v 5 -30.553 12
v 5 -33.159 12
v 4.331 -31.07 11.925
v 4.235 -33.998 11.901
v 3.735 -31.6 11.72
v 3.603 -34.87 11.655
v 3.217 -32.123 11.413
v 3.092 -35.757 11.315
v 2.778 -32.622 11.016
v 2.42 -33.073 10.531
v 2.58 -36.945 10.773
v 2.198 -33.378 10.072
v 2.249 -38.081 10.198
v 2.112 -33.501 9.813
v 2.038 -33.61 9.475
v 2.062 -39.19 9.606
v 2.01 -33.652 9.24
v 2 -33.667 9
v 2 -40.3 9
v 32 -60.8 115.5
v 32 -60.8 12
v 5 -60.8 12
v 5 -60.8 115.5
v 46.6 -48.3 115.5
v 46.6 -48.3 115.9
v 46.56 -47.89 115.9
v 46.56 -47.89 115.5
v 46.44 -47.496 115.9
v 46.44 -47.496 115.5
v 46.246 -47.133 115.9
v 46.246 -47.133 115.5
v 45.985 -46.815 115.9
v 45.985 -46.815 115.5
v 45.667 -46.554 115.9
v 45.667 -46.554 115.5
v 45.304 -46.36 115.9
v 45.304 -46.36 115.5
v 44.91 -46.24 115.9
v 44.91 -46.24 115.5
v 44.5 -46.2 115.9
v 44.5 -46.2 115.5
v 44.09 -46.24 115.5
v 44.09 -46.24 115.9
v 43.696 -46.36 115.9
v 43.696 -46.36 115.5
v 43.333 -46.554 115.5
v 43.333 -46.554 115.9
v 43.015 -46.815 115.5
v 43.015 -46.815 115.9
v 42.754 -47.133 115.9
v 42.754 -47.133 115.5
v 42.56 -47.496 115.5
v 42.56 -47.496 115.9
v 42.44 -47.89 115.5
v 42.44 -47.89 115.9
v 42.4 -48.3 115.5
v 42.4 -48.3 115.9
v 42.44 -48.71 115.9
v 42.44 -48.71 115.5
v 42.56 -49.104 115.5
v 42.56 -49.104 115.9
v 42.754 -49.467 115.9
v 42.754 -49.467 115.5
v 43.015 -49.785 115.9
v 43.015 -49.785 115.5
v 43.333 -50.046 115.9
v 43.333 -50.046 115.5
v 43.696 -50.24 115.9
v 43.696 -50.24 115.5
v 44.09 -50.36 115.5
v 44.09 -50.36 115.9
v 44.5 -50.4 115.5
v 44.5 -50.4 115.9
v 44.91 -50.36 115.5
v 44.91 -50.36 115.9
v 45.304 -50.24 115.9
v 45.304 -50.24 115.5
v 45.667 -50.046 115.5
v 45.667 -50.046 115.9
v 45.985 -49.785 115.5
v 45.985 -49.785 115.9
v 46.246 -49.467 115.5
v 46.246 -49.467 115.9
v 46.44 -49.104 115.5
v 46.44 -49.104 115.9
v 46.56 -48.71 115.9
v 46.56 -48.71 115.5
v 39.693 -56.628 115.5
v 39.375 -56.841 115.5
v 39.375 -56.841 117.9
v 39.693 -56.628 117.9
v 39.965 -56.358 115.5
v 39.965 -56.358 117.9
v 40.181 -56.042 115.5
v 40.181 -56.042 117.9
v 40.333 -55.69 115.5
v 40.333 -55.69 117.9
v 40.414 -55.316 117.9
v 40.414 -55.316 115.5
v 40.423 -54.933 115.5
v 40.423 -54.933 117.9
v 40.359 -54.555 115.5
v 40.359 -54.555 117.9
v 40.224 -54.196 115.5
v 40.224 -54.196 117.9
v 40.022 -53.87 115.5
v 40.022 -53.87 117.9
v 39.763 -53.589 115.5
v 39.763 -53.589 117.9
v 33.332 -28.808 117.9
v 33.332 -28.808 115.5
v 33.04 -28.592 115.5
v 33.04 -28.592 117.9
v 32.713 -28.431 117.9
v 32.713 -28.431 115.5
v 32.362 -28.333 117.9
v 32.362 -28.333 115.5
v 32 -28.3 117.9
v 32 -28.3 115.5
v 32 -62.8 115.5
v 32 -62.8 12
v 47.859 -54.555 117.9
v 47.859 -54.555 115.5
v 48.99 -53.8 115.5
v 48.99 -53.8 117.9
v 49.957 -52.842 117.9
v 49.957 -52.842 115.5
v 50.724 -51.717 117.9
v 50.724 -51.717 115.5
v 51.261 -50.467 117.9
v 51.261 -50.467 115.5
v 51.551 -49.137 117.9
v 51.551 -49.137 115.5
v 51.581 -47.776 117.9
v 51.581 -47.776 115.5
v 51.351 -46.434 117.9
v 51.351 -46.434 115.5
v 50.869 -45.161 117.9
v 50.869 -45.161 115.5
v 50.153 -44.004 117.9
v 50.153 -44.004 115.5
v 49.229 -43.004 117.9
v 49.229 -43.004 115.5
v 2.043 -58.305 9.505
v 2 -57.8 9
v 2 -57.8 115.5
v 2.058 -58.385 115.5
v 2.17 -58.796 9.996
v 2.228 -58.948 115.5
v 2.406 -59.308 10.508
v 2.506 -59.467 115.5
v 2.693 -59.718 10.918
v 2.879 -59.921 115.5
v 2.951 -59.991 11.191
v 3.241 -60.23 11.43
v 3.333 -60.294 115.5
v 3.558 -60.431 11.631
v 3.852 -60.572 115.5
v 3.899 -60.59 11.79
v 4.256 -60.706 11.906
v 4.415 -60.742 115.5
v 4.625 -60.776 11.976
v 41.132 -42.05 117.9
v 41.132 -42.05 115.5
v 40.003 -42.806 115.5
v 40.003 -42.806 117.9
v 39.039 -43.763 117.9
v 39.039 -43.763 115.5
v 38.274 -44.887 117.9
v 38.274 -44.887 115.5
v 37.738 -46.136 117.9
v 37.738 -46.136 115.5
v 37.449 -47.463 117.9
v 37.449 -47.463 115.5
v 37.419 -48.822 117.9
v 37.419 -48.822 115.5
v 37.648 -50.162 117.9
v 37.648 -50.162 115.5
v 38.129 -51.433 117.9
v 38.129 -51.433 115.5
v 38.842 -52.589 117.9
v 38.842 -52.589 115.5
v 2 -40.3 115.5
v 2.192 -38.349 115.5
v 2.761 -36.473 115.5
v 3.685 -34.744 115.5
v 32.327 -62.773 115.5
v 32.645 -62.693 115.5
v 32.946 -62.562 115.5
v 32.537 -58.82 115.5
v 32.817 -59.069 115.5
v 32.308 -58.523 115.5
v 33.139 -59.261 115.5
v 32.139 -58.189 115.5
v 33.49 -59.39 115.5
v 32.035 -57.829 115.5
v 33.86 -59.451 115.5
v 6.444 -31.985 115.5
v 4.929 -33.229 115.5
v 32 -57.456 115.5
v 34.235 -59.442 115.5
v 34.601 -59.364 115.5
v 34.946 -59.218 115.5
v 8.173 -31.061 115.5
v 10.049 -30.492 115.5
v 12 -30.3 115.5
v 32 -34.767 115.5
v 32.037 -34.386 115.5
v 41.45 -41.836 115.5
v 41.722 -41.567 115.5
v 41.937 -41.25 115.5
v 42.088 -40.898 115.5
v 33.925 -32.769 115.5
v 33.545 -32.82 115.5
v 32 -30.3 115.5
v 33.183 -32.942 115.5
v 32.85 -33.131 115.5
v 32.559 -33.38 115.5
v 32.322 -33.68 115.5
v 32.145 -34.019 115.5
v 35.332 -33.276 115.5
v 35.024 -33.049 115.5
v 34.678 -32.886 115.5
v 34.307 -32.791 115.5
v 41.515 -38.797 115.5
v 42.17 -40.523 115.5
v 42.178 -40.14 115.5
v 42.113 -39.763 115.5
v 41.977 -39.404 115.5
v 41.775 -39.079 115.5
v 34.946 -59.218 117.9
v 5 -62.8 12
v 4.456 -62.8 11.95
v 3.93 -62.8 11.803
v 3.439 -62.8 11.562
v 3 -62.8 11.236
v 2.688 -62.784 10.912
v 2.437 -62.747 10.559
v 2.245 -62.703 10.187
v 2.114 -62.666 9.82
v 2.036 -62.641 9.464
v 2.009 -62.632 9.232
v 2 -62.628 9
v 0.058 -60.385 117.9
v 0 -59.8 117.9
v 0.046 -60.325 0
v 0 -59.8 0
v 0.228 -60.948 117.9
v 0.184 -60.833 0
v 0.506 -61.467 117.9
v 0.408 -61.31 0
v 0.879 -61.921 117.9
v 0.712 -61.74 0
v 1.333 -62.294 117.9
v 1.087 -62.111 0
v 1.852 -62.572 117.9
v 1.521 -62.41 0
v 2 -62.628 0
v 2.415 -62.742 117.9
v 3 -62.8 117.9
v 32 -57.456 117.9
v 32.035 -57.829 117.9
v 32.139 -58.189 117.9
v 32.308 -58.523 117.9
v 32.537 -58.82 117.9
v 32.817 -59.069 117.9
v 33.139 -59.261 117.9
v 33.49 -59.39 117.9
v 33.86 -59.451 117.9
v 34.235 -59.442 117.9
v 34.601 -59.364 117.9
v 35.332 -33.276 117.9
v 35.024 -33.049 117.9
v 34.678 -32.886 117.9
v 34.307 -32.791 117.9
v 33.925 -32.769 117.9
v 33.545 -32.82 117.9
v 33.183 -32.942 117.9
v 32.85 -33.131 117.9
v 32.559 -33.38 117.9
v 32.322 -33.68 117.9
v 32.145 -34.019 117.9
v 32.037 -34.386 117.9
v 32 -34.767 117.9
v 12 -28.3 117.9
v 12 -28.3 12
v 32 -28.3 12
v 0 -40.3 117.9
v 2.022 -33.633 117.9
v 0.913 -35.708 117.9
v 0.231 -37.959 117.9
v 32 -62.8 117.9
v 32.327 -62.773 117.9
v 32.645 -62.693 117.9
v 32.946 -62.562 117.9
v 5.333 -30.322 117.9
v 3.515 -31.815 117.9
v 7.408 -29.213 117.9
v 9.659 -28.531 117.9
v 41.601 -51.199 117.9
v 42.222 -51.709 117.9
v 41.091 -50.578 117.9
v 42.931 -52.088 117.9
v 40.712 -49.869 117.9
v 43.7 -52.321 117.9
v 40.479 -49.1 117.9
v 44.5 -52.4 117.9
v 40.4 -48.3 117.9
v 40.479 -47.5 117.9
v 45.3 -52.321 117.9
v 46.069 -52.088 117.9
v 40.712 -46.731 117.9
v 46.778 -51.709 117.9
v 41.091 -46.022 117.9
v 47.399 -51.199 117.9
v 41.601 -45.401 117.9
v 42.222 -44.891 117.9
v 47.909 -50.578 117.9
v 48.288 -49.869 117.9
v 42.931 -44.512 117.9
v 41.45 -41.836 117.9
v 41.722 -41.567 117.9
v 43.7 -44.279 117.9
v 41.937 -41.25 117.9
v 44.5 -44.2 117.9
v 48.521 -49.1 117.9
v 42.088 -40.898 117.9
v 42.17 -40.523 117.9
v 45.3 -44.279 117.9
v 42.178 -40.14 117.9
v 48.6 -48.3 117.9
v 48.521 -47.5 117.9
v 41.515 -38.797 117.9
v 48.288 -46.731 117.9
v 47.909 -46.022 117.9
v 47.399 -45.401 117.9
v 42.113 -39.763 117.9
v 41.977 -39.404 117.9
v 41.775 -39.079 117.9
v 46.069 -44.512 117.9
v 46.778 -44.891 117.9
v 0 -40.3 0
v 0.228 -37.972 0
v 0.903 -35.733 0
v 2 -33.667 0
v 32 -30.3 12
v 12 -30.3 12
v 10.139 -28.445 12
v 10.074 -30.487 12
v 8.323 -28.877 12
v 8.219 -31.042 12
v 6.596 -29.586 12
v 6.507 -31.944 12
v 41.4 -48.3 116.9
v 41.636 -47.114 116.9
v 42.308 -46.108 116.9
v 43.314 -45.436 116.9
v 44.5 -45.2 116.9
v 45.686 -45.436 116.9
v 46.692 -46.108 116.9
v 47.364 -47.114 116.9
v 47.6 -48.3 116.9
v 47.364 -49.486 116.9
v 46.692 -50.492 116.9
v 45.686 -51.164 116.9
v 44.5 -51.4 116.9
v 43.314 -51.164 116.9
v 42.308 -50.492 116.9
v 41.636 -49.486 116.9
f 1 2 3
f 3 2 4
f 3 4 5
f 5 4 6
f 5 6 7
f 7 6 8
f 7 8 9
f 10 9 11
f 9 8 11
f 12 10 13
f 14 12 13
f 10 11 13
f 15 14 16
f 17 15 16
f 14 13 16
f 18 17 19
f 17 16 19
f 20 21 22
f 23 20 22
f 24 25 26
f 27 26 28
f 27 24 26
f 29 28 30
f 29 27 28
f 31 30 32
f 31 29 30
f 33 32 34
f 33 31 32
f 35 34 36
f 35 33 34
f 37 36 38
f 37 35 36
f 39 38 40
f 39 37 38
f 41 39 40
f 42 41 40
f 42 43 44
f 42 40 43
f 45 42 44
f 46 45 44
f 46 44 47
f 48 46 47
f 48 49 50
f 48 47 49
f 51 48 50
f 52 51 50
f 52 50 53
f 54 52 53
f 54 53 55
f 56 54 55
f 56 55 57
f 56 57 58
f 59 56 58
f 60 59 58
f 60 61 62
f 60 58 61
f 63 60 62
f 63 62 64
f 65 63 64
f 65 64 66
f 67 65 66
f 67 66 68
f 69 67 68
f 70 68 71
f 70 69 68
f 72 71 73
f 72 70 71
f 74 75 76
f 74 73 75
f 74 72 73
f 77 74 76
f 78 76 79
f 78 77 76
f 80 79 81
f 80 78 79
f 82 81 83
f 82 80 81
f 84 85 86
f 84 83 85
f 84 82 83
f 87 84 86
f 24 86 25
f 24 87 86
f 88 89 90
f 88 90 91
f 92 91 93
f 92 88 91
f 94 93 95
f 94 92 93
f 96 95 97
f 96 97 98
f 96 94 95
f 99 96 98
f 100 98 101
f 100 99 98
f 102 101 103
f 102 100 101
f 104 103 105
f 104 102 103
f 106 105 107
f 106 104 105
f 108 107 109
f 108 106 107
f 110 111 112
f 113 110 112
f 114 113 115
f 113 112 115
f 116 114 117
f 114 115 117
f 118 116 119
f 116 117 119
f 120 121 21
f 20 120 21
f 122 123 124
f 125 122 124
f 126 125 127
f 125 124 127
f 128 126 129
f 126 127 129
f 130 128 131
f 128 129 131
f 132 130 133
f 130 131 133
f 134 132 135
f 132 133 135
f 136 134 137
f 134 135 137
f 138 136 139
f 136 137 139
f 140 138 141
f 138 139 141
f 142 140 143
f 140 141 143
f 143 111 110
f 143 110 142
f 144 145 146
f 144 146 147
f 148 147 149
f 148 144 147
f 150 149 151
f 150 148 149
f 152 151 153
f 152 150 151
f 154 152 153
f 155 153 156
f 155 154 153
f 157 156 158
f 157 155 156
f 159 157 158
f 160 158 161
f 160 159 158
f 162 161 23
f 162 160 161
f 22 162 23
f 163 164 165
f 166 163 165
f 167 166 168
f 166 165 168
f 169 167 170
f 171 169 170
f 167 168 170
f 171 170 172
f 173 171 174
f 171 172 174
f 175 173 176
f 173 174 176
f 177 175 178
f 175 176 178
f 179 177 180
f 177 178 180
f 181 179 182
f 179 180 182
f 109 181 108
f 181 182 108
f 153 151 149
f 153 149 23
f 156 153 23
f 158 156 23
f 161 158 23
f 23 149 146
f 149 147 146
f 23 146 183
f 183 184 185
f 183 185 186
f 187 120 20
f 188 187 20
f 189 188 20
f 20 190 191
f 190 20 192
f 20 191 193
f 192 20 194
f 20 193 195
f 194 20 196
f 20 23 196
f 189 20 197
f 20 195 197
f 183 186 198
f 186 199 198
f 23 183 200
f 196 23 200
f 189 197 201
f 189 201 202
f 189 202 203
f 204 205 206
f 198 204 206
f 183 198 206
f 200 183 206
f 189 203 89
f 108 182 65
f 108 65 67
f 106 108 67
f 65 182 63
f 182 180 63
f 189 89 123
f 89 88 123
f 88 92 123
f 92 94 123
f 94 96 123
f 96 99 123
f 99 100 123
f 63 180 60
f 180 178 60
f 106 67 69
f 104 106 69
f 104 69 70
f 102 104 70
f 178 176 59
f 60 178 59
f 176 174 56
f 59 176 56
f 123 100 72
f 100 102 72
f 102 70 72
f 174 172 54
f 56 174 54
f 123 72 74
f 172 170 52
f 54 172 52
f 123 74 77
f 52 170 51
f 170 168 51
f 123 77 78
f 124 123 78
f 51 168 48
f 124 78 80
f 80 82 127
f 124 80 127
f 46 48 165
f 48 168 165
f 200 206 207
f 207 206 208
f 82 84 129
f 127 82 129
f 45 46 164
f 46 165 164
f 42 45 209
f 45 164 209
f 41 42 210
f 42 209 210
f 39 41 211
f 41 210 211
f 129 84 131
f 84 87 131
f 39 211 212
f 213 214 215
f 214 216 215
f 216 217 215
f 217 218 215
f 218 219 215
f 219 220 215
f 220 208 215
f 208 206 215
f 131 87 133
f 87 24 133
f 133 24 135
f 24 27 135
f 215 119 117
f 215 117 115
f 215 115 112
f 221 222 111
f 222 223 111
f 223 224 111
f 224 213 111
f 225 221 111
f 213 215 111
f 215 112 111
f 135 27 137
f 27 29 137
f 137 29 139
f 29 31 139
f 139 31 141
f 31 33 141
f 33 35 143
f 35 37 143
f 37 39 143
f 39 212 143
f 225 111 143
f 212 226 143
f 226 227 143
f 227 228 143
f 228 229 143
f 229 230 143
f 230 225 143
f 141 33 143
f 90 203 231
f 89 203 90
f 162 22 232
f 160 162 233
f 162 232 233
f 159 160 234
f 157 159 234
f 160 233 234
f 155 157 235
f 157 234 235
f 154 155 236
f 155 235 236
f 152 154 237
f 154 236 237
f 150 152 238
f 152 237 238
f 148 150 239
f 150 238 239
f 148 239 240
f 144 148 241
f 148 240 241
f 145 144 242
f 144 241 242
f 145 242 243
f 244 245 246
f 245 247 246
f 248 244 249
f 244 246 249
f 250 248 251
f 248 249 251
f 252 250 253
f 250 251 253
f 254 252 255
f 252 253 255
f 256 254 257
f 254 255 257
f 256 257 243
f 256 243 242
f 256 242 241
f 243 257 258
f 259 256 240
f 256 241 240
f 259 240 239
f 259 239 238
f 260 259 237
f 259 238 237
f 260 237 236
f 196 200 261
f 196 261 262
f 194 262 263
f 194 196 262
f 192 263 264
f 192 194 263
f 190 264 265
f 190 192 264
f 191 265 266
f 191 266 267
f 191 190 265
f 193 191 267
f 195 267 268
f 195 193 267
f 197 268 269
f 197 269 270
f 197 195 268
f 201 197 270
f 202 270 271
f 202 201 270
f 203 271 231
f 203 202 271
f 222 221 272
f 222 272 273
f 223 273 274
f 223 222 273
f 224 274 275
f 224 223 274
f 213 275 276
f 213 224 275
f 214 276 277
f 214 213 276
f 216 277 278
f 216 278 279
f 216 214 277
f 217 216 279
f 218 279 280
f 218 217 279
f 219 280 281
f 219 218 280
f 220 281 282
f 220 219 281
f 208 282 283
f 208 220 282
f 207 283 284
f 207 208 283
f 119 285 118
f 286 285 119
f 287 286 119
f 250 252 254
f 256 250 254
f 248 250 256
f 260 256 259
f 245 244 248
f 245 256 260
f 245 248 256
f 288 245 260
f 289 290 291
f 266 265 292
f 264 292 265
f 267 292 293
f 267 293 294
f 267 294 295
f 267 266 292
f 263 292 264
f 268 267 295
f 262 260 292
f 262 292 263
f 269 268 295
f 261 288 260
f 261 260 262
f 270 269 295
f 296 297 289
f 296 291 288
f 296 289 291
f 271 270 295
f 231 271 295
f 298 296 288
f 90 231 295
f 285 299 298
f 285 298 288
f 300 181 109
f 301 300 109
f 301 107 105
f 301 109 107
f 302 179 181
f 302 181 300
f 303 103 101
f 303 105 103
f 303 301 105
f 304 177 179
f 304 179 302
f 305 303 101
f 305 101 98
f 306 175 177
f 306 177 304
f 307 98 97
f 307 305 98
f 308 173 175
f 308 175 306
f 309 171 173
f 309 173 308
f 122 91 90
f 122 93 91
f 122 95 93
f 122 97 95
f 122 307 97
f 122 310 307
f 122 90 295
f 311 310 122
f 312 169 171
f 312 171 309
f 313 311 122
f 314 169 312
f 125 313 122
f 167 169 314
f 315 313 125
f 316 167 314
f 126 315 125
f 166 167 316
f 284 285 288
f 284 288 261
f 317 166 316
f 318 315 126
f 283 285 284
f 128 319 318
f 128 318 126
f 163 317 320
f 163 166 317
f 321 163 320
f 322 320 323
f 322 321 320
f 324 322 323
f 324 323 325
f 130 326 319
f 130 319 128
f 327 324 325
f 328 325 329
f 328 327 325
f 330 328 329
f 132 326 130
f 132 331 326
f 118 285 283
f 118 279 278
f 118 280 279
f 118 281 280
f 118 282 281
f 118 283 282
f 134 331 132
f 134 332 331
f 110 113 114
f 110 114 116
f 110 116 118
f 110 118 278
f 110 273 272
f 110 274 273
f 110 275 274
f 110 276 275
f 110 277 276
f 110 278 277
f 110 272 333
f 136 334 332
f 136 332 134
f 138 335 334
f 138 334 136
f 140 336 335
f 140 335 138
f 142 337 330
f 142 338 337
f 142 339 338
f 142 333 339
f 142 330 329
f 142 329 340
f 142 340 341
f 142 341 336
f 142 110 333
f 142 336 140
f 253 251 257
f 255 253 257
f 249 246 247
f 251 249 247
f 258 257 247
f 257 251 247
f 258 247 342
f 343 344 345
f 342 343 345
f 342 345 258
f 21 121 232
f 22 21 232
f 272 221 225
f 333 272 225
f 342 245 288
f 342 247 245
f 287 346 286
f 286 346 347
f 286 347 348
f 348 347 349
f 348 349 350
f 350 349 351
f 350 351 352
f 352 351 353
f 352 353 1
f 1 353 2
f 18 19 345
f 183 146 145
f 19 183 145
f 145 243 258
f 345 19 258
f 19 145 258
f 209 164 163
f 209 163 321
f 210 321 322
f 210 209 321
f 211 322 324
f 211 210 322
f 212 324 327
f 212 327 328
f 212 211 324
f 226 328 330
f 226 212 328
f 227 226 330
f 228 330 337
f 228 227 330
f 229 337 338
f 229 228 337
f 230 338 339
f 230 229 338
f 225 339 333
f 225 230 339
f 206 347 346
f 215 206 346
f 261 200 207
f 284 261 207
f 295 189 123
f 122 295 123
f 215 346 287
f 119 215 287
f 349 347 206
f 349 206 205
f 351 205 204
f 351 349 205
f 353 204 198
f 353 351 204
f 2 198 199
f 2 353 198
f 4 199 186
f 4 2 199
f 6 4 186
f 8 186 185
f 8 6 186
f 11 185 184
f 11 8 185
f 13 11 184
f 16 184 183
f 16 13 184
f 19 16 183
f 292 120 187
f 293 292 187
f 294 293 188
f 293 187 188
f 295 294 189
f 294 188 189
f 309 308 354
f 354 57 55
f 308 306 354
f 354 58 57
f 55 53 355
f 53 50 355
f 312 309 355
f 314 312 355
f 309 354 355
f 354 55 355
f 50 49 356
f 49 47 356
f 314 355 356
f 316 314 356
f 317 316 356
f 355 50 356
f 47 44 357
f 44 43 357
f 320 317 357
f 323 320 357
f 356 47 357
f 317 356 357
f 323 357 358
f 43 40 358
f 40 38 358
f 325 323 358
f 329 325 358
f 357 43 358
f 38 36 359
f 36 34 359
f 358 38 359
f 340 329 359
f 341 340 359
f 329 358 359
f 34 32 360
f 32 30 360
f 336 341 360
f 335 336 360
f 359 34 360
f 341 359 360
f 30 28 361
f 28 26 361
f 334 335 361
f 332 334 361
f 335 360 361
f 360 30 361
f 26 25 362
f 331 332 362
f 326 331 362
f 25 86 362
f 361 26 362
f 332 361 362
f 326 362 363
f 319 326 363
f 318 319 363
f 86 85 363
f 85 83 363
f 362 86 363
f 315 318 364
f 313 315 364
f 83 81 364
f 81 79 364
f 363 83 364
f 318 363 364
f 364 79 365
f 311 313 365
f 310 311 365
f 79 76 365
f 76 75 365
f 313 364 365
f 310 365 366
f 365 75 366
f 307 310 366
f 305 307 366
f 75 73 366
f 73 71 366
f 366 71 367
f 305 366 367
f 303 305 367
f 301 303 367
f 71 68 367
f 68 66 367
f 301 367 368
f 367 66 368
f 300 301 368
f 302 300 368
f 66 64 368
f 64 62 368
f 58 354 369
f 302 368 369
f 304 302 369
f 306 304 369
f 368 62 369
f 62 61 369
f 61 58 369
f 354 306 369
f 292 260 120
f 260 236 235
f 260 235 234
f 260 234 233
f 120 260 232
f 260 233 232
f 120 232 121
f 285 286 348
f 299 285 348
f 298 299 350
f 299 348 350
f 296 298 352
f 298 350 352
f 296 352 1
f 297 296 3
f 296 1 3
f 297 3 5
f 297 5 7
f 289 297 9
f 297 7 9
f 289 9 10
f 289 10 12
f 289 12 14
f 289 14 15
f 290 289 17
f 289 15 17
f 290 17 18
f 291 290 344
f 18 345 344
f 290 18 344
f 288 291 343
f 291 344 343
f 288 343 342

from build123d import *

# Parameters (mm, degrees)
PAD015_DEPTH        = 115.5
POCKET006_DEPTH     = 2
POCKET007_DEPTH     = 34.501
SKETCH032_R         = 2.1
PAD016_DEPTH        = 2.4
HOLE006_D           = 4
HOLE006_DEPTH       = 25
HOLE006_CSINK_D     = 8.2
HOLE006_CSINK_ANGLE = 90
HOLE006_TIPS_R      = 2


with BuildPart() as part:
    # Sketch029 → Pad015 (new body)
    with BuildSketch(Plane.XY):
        with BuildLine():
            Line((32, 34.5), (12, 34.5))
            ThreePointArc((12, 34.5), (3.514719, 30.985281), (0, 22.5))
            Line((0, 22.5), (0, 3))
            ThreePointArc((0, 3), (0.87868, 0.87868), (3, 0))
            Line((3, 0), (32, 0))
            Line((32, 0), (32, 2))
            Line((32, 2), (5, 2))
            ThreePointArc((2, 5), (2.87868, 2.87868), (5, 2))
            Line((2, 5), (2, 22.5))
            ThreePointArc((12, 32.5), (4.928932, 29.571068), (2, 22.5))
            Line((12, 32.5), (32, 32.5))
            Line((32, 32.5), (32, 34.5))
        make_face()
    extrude(amount=PAD015_DEPTH)

    # Sketch030 (on Face3 of Pad015) → Pocket006 (cut)
    with BuildSketch(Plane(origin=(0, 34.5, 0), x_dir=(-1, 0, 0), z_dir=(0, 1, 0))):
        with BuildLine():
            Line((-32, 0), (-12, 0))
            Line((-12, 0), (-12, 7))
            ThreePointArc((-12, 7), (-12.87868, 9.12132), (-15, 10))
            Line((-15, 10), (-32, 10))
            Line((-32, 10), (-32, 0))
        make_face()
    extrude(amount=-POCKET006_DEPTH, mode=Mode.SUBTRACT)

    # Sketch031 (on Face12 of Pocket006) → Pocket007 (cut, through all)
    with BuildSketch(Plane.XZ):
        with BuildLine():
            Line((2, 0), (32, 0))
            Line((32, 0), (32, 12))
            Line((32, 12), (5, 12))
            ThreePointArc((5, 12), (2.87868, 11.12132), (2, 9))
            Line((2, 9), (2, 0))
        make_face()
    extrude(amount=-POCKET007_DEPTH, mode=Mode.SUBTRACT)

    # Sketch032 (on Face4 of Pocket007) → Pad016 (join)
    with BuildSketch(Plane.XY.offset(115.5)):
        with BuildLine():
            ThreePointArc((12, 34.5), (3.514719, 30.985281), (0, 22.5))
            Line((0, 3), (0, 22.5))
            ThreePointArc((0, 3), (0.87868, 0.87868), (3, 0))
            Line((3, 0), (32, 0))
            ThreePointArc((32, 0), (32.487769, 0.060391), (32.946081, 0.237919))
            Line((32.946081, 0.237919), (47.858588, 8.244612))
            ThreePointArc((47.858588, 8.244612), (51.550546, 13.663456), (49.22913, 19.795784))
            Line((33.332149, 33.99177), (49.22913, 19.795784))
            ThreePointArc((33.332149, 33.99177), (32.712902, 34.368628), (32, 34.5))
            Line((12, 34.5), (32, 34.5))
        make_face()
        with Locations((44.5, 14.5)):
            Circle(SKETCH032_R, mode=Mode.SUBTRACT)
        with BuildLine():
            Line((32, 5.343865), (32, 28.032624))
            ThreePointArc((35.332149, 29.524394), (33.182779, 29.858042), (32, 28.032624))
            Line((35.332149, 29.524394), (41.515411, 24.002748))
            ThreePointArc((41.131996, 20.750324), (42.169508, 22.276828), (41.515411, 24.002748))
            ThreePointArc((41.131996, 20.750324), (37.449454, 15.336544), (39.762901, 9.211343))
            ThreePointArc((39.374588, 5.959499), (40.414398, 7.484439), (39.762901, 9.211343))
            Line((34.946081, 3.581784), (39.374588, 5.959499))
            ThreePointArc((32, 5.343865), (32.973395, 3.62745), (34.946081, 3.581784))
        make_face(mode=Mode.SUBTRACT)
    extrude(amount=PAD016_DEPTH)

    # Hole006
    with Locations(Plane.XY.offset(117.9)):
        with Locations((44.5, 14.5)):
            CounterSinkHole(HOLE006_D / 2, HOLE006_CSINK_D / 2, depth=HOLE006_DEPTH, counter_sink_angle=HOLE006_CSINK_ANGLE)

    # Hole006 tips → Hole006 tip 1 section 0
    with BuildSketch(Plane.XY.offset(92.9), mode=Mode.PRIVATE) as hole006_tip_1_s0:
        with Locations((44.5, 14.5)):
            Circle(HOLE006_TIPS_R)
    loft([hole006_tip_1_s0.sketch, Vertex(44.5, 14.5, 91.698279)], mode=Mode.SUBTRACT)


with BuildPart() as part_1:
    # Body006 placement: moved
    add(part.part.moved(Location((0, -62.8, 0))))


solid = part_1.part
